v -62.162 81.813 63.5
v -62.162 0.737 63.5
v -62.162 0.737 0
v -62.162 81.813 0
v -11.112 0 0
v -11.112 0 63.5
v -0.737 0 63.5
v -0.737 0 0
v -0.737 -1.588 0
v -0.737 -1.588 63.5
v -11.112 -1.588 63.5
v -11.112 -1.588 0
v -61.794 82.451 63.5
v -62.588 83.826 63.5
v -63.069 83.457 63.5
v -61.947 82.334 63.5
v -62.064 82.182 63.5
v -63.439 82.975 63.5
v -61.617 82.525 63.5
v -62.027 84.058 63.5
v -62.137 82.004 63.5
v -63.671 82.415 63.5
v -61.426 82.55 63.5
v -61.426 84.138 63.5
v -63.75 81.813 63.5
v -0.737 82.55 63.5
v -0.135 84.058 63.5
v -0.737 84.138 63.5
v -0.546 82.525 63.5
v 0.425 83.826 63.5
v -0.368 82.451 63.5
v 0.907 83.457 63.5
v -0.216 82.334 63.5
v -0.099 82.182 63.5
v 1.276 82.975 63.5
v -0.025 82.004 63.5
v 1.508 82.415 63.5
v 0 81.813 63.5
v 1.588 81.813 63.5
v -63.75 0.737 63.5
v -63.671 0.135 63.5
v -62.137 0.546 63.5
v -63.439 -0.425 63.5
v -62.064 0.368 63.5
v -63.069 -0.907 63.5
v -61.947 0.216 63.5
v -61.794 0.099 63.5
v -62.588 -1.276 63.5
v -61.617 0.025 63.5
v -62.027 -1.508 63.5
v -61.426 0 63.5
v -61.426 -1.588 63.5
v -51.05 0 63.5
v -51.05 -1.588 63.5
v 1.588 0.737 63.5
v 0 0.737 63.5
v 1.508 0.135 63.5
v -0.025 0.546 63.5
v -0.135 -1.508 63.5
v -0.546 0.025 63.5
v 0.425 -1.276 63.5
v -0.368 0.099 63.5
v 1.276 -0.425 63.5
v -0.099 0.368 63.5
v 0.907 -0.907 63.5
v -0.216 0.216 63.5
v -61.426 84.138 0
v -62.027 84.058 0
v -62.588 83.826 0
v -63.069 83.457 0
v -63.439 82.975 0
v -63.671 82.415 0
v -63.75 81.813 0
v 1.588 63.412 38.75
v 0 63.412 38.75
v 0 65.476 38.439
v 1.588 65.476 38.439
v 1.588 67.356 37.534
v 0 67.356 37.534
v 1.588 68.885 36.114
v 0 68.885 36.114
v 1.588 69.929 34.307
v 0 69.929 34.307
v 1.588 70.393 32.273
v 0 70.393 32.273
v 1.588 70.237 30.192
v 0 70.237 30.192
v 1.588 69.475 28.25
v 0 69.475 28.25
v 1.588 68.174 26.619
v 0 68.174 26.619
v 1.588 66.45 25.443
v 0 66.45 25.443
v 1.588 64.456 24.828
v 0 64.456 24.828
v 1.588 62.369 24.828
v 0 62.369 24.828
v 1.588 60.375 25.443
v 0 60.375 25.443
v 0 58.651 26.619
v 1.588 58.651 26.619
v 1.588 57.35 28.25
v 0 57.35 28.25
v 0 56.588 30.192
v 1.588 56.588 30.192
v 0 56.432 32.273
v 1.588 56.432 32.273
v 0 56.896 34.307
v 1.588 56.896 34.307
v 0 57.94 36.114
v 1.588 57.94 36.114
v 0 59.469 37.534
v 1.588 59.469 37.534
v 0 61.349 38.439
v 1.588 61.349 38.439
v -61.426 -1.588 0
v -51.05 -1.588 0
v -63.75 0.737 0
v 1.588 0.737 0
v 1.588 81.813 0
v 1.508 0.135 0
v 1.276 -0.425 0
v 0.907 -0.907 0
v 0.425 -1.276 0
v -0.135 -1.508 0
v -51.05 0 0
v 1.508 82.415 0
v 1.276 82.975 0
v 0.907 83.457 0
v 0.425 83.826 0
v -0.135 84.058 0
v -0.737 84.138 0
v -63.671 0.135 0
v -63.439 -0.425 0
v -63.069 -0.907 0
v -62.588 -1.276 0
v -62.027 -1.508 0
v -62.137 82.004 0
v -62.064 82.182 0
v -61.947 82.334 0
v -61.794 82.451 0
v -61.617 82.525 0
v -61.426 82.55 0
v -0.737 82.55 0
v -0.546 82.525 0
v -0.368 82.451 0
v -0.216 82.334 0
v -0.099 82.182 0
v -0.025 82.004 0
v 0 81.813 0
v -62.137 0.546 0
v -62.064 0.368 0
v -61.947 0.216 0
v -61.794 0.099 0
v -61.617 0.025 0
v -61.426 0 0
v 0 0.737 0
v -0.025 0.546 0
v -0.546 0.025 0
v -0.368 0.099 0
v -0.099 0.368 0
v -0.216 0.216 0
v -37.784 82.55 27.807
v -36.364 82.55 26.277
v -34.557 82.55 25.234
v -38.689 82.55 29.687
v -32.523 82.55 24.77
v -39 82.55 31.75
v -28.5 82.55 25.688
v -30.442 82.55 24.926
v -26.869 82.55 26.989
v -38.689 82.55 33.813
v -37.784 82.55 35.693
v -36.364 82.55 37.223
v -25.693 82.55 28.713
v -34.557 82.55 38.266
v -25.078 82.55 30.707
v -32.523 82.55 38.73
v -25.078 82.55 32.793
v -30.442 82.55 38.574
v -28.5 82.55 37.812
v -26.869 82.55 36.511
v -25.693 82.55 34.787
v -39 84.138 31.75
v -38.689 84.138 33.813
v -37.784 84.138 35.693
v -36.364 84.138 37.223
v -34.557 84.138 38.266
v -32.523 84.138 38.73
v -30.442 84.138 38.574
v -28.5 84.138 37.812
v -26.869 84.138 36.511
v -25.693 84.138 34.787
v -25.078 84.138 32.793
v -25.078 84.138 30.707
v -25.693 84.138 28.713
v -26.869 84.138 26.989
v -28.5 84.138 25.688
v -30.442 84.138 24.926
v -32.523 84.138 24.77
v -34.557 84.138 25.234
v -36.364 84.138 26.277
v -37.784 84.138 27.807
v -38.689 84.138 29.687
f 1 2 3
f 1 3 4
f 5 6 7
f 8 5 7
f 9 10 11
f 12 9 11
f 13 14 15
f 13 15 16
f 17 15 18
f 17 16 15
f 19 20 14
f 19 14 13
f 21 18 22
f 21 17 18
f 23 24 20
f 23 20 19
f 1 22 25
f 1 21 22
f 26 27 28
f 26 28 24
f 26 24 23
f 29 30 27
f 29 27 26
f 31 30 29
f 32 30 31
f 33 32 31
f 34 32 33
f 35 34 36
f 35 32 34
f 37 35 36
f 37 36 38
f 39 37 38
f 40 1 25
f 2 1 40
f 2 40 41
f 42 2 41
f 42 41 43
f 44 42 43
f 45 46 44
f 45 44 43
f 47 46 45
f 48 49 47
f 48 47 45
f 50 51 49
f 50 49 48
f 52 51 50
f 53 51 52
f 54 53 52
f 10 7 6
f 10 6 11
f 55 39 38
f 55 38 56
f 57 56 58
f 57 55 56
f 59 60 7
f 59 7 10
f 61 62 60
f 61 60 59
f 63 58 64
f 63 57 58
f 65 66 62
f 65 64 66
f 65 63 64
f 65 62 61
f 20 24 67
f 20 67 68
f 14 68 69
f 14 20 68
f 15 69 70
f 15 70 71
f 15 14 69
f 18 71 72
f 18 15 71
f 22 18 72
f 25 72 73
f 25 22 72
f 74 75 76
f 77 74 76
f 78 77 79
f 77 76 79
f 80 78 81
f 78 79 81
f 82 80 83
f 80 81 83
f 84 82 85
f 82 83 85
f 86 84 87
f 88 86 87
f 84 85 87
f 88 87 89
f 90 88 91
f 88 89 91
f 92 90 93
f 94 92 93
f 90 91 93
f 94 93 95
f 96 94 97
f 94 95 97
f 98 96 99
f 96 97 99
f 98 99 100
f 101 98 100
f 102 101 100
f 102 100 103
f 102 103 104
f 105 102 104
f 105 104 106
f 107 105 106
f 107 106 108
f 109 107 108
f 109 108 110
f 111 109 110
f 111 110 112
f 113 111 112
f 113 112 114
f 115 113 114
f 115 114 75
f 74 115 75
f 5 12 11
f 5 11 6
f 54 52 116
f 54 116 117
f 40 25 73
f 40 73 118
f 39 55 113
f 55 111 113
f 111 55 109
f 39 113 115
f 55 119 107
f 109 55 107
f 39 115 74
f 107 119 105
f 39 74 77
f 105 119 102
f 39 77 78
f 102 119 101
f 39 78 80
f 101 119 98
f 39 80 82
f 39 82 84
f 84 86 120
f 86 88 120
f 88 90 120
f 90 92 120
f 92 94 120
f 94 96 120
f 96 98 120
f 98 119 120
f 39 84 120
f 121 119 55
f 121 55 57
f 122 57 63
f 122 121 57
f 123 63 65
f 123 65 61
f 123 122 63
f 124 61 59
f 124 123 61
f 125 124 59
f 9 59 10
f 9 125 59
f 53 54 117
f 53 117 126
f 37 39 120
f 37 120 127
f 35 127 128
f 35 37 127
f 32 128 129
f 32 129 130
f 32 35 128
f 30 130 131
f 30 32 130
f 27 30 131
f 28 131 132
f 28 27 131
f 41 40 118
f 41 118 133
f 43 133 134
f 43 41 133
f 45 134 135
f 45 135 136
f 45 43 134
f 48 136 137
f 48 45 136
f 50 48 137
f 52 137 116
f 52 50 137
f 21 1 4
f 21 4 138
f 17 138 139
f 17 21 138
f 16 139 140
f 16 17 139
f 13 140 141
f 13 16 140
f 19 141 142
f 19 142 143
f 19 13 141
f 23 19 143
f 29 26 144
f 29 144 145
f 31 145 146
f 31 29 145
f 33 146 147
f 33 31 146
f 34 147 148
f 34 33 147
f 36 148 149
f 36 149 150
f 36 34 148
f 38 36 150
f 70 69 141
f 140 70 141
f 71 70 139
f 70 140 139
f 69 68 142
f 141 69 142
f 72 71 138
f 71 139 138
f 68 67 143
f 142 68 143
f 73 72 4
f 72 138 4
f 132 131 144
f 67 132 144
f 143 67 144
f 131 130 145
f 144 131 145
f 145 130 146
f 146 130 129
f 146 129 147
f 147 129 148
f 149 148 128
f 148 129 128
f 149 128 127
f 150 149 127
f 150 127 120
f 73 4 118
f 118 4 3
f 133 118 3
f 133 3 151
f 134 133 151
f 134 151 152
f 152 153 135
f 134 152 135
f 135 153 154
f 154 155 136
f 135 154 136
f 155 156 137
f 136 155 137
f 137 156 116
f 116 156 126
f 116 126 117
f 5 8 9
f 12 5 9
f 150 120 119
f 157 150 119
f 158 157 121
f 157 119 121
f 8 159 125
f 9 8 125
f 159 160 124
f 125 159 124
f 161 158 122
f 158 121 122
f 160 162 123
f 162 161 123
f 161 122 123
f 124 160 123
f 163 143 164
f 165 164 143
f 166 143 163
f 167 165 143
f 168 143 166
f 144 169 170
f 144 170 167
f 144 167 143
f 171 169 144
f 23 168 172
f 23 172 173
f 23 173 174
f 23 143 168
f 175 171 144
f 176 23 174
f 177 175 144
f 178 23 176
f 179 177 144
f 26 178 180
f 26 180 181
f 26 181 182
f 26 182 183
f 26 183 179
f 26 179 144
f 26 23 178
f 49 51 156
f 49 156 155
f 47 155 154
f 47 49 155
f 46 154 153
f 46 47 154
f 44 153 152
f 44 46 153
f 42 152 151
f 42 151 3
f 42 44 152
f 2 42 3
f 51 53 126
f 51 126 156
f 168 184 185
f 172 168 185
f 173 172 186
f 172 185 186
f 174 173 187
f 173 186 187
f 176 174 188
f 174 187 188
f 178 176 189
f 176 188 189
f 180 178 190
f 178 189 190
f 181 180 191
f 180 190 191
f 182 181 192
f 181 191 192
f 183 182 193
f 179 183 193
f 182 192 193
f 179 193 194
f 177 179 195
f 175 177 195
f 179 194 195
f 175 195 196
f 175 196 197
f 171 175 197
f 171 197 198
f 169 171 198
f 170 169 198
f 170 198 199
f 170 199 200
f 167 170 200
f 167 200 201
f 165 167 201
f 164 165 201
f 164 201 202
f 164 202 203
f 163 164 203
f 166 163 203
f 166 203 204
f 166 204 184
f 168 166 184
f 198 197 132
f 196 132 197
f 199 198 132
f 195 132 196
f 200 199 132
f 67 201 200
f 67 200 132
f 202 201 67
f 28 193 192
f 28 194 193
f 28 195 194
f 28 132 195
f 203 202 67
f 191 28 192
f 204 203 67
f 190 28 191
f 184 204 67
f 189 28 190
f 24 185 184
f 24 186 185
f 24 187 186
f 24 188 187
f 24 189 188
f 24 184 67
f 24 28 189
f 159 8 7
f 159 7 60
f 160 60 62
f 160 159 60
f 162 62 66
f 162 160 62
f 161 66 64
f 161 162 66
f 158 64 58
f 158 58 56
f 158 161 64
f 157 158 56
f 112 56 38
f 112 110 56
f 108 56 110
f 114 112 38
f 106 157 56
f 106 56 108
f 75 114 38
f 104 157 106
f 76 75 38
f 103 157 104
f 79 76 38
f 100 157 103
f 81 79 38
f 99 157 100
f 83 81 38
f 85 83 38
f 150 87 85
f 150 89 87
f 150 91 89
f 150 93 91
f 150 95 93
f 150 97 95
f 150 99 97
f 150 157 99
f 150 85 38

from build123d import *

# Parameters (mm, degrees)
SKETCH2_W                    = 1.5875
SKETCH2_H                    = 82.55
BASE_FLANGE1_DEPTH           = 63.5
EDGE_FLANGE1_STRIP_W         = 7.8232
EDGE_FLANGE1_STRIP_H         = 1.5875
EDGE_FLANGE1_STRIP_CUT_DEPTH = 63.5
EDGE_FLANGE1_DEPTH           = 63.5
SKETCH10_R                   = 7
CUT_EXTRUDE1_DEPTH           = 105.73891424
EDGE_FLANGE2_STRIP_W         = 7.8232
EDGE_FLANGE2_STRIP_H         = 1.5875
EDGE_FLANGE2_STRIP_CUT_DEPTH = 63.5
EDGE_FLANGE2_DEPTH           = 63.5
EDGE_FLANGE3_STRIP_W         = 7.8232
EDGE_FLANGE3_STRIP_H         = 1.5875
EDGE_FLANGE3_STRIP_CUT_DEPTH = 63.5
EDGE_FLANGE3_DEPTH           = 63.5
EDGE_FLANGE4_STRIP_W         = 7.8232
EDGE_FLANGE4_STRIP_H         = 1.5875
EDGE_FLANGE4_STRIP_CUT_DEPTH = 63.5
EDGE_FLANGE4_DEPTH           = 63.5
SKETCH20_R                   = 7
CUT_EXTRUDE2_DEPTH           = 125.278268888


# Sheet-metal steps are written as plain solids
with BuildPart() as part:
    # Sketch2 → Base-Flange1 (new body)
    with BuildSketch(Plane.XY):
        with Locations((0.79375, 41.275)):
            Rectangle(SKETCH2_W, SKETCH2_H)
    extrude(amount=BASE_FLANGE1_DEPTH)

    # Edge-Flange1 strip (across the edge) → Edge-Flange1 strip cut (cut)
    with BuildSketch(Plane(origin=(0, 0, 0), x_dir=(0, 1, 0), z_dir=(0, 0, 1))):
        with Locations((-3.175, -0.79375)):
            Rectangle(EDGE_FLANGE1_STRIP_W, EDGE_FLANGE1_STRIP_H)
    extrude(amount=EDGE_FLANGE1_STRIP_CUT_DEPTH, mode=Mode.SUBTRACT)

    # Edge-Flange1 section (across the edge) → Edge-Flange1 (add)
    with BuildSketch(Plane(origin=(0, 0, 0), x_dir=(0, 1, 0), z_dir=(0, 0, 1))):
        with BuildLine():
            Line((-1.5875, 0.7366), (-1.5875, 11.1125))
            Line((-1.5875, 11.1125), (0, 11.1125))
            Line((0, 11.1125), (0, 0.7366))
            ThreePointArc((0, 0.7366), (0.215745145, 0.215745145), (0.7366, 0))
            Line((0.7366, 0), (0.7366, -1.5875))
            ThreePointArc((0.7366, -1.5875), (-0.90678687, -0.90678687), (-1.5875, 0.7366))
        make_face()
    extrude(amount=EDGE_FLANGE1_DEPTH)

    # Sketch10 → Cut-Extrude1 (cut, through all)
    with BuildSketch(Plane.ZY):
        with Locations((31.75, 63.4125)):
            Circle(SKETCH10_R)
    extrude(amount=-CUT_EXTRUDE1_DEPTH, mode=Mode.SUBTRACT)

    # Edge-Flange2 strip (across the edge) → Edge-Flange2 strip cut (cut)
    with BuildSketch(Plane(origin=(0, 82.55, 63.5), x_dir=(0, -1, 0), z_dir=(0, 0, -1))):
        with Locations((-3.175, -0.79375)):
            Rectangle(EDGE_FLANGE2_STRIP_W, EDGE_FLANGE2_STRIP_H)
    extrude(amount=EDGE_FLANGE2_STRIP_CUT_DEPTH, mode=Mode.SUBTRACT)

    # Edge-Flange2 section (across the edge) → Edge-Flange2 (add)
    with BuildSketch(Plane(origin=(0, 82.55, 63.5), x_dir=(0, -1, 0), z_dir=(0, 0, -1))):
        with BuildLine():
            Line((-1.5875, 0.7366), (-1.5875, 62.162499944))
            Line((-1.5875, 62.162499944), (0, 62.162499944))
            Line((0, 62.162499944), (0, 0.7366))
            ThreePointArc((0, 0.7366), (0.215745145, 0.215745145), (0.7366, 0))
            Line((0.7366, 0), (0.7366, -1.5875))
            ThreePointArc((0.7366, -1.5875), (-0.90678687, -0.90678687), (-1.5875, 0.7366))
        make_face()
    extrude(amount=EDGE_FLANGE2_DEPTH)

    # Edge-Flange3 strip (across the edge) → Edge-Flange3 strip cut (cut)
    with BuildSketch(Plane(origin=(-62.162499944, 82.55, 63.5), x_dir=(1, 0, 0), z_dir=(0, 0, -1))):
        with Locations((-3.175, -0.79375)):
            Rectangle(EDGE_FLANGE3_STRIP_W, EDGE_FLANGE3_STRIP_H)
    extrude(amount=EDGE_FLANGE3_STRIP_CUT_DEPTH, mode=Mode.SUBTRACT)

    # Edge-Flange3 section (across the edge) → Edge-Flange3 (add)
    with BuildSketch(Plane(origin=(-62.162499944, 82.55, 63.5), x_dir=(1, 0, 0), z_dir=(0, 0, -1))):
        with BuildLine():
            Line((-1.5875, 0.7366), (-1.5875, 82.55))
            Line((-1.5875, 82.55), (0, 82.55))
            Line((0, 82.55), (0, 0.7366))
            ThreePointArc((0, 0.7366), (0.215745145, 0.215745145), (0.7366, 0))
            Line((0.7366, 0), (0.7366, -1.5875))
            ThreePointArc((0.7366, -1.5875), (-0.90678687, -0.90678687), (-1.5875, 0.7366))
        make_face()
    extrude(amount=EDGE_FLANGE3_DEPTH)

    # Edge-Flange4 strip (across the edge) → Edge-Flange4 strip cut (cut)
    with BuildSketch(Plane(origin=(-62.162499944, 0, 63.5), x_dir=(0, 1, 0), z_dir=(0, 0, -1))):
        with Locations((-3.175, -0.79375)):
            Rectangle(EDGE_FLANGE4_STRIP_W, EDGE_FLANGE4_STRIP_H)
    extrude(amount=EDGE_FLANGE4_STRIP_CUT_DEPTH, mode=Mode.SUBTRACT)

    # Edge-Flange4 section (across the edge) → Edge-Flange4 (add)
    with BuildSketch(Plane(origin=(-62.162499944, 0, 63.5), x_dir=(0, 1, 0), z_dir=(0, 0, -1))):
        with BuildLine():
            Line((-1.5875, 0.7366), (-1.5875, 11.1125))
            Line((-1.5875, 11.1125), (0, 11.1125))
            Line((0, 11.1125), (0, 0.7366))
            ThreePointArc((0, 0.7366), (0.215745145, 0.215745145), (0.7366, 0))
            Line((0.7366, 0), (0.7366, -1.5875))
            ThreePointArc((0.7366, -1.5875), (-0.90678687, -0.90678687), (-1.5875, 0.7366))
        make_face()
    extrude(amount=EDGE_FLANGE4_DEPTH)

    # Sketch20 → Cut-Extrude2 (cut, through all)
    with BuildSketch(Plane(origin=(0, 84.1375, 0), x_dir=(1, 0, 0), z_dir=(0, 1, 0))):
        with Locations(Location((-32, -31.75, 0), (0, 0, 180))):
            Circle(SKETCH20_R)
    extrude(amount=-CUT_EXTRUDE2_DEPTH, mode=Mode.SUBTRACT)


solid = part.part
